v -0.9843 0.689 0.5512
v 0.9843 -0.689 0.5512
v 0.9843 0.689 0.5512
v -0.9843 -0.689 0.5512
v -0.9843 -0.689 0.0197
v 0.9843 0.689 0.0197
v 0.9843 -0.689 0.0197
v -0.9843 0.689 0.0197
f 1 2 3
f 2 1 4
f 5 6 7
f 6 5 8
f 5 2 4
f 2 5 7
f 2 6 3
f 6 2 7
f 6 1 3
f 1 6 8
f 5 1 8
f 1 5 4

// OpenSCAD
// file: defines.scad
L = 5;  // Длина
W = 3.5;  // Ширина
H = 1.4;  // Высота

Hf = 0.05;

scale = 1/2.54;
// main file
include <defines.scad>

scale(scale)
  color([0.15, 0.15, 0.15])
    translate([-L/2, -W/2, Hf])
      cube([L, W, H - Hf]);
